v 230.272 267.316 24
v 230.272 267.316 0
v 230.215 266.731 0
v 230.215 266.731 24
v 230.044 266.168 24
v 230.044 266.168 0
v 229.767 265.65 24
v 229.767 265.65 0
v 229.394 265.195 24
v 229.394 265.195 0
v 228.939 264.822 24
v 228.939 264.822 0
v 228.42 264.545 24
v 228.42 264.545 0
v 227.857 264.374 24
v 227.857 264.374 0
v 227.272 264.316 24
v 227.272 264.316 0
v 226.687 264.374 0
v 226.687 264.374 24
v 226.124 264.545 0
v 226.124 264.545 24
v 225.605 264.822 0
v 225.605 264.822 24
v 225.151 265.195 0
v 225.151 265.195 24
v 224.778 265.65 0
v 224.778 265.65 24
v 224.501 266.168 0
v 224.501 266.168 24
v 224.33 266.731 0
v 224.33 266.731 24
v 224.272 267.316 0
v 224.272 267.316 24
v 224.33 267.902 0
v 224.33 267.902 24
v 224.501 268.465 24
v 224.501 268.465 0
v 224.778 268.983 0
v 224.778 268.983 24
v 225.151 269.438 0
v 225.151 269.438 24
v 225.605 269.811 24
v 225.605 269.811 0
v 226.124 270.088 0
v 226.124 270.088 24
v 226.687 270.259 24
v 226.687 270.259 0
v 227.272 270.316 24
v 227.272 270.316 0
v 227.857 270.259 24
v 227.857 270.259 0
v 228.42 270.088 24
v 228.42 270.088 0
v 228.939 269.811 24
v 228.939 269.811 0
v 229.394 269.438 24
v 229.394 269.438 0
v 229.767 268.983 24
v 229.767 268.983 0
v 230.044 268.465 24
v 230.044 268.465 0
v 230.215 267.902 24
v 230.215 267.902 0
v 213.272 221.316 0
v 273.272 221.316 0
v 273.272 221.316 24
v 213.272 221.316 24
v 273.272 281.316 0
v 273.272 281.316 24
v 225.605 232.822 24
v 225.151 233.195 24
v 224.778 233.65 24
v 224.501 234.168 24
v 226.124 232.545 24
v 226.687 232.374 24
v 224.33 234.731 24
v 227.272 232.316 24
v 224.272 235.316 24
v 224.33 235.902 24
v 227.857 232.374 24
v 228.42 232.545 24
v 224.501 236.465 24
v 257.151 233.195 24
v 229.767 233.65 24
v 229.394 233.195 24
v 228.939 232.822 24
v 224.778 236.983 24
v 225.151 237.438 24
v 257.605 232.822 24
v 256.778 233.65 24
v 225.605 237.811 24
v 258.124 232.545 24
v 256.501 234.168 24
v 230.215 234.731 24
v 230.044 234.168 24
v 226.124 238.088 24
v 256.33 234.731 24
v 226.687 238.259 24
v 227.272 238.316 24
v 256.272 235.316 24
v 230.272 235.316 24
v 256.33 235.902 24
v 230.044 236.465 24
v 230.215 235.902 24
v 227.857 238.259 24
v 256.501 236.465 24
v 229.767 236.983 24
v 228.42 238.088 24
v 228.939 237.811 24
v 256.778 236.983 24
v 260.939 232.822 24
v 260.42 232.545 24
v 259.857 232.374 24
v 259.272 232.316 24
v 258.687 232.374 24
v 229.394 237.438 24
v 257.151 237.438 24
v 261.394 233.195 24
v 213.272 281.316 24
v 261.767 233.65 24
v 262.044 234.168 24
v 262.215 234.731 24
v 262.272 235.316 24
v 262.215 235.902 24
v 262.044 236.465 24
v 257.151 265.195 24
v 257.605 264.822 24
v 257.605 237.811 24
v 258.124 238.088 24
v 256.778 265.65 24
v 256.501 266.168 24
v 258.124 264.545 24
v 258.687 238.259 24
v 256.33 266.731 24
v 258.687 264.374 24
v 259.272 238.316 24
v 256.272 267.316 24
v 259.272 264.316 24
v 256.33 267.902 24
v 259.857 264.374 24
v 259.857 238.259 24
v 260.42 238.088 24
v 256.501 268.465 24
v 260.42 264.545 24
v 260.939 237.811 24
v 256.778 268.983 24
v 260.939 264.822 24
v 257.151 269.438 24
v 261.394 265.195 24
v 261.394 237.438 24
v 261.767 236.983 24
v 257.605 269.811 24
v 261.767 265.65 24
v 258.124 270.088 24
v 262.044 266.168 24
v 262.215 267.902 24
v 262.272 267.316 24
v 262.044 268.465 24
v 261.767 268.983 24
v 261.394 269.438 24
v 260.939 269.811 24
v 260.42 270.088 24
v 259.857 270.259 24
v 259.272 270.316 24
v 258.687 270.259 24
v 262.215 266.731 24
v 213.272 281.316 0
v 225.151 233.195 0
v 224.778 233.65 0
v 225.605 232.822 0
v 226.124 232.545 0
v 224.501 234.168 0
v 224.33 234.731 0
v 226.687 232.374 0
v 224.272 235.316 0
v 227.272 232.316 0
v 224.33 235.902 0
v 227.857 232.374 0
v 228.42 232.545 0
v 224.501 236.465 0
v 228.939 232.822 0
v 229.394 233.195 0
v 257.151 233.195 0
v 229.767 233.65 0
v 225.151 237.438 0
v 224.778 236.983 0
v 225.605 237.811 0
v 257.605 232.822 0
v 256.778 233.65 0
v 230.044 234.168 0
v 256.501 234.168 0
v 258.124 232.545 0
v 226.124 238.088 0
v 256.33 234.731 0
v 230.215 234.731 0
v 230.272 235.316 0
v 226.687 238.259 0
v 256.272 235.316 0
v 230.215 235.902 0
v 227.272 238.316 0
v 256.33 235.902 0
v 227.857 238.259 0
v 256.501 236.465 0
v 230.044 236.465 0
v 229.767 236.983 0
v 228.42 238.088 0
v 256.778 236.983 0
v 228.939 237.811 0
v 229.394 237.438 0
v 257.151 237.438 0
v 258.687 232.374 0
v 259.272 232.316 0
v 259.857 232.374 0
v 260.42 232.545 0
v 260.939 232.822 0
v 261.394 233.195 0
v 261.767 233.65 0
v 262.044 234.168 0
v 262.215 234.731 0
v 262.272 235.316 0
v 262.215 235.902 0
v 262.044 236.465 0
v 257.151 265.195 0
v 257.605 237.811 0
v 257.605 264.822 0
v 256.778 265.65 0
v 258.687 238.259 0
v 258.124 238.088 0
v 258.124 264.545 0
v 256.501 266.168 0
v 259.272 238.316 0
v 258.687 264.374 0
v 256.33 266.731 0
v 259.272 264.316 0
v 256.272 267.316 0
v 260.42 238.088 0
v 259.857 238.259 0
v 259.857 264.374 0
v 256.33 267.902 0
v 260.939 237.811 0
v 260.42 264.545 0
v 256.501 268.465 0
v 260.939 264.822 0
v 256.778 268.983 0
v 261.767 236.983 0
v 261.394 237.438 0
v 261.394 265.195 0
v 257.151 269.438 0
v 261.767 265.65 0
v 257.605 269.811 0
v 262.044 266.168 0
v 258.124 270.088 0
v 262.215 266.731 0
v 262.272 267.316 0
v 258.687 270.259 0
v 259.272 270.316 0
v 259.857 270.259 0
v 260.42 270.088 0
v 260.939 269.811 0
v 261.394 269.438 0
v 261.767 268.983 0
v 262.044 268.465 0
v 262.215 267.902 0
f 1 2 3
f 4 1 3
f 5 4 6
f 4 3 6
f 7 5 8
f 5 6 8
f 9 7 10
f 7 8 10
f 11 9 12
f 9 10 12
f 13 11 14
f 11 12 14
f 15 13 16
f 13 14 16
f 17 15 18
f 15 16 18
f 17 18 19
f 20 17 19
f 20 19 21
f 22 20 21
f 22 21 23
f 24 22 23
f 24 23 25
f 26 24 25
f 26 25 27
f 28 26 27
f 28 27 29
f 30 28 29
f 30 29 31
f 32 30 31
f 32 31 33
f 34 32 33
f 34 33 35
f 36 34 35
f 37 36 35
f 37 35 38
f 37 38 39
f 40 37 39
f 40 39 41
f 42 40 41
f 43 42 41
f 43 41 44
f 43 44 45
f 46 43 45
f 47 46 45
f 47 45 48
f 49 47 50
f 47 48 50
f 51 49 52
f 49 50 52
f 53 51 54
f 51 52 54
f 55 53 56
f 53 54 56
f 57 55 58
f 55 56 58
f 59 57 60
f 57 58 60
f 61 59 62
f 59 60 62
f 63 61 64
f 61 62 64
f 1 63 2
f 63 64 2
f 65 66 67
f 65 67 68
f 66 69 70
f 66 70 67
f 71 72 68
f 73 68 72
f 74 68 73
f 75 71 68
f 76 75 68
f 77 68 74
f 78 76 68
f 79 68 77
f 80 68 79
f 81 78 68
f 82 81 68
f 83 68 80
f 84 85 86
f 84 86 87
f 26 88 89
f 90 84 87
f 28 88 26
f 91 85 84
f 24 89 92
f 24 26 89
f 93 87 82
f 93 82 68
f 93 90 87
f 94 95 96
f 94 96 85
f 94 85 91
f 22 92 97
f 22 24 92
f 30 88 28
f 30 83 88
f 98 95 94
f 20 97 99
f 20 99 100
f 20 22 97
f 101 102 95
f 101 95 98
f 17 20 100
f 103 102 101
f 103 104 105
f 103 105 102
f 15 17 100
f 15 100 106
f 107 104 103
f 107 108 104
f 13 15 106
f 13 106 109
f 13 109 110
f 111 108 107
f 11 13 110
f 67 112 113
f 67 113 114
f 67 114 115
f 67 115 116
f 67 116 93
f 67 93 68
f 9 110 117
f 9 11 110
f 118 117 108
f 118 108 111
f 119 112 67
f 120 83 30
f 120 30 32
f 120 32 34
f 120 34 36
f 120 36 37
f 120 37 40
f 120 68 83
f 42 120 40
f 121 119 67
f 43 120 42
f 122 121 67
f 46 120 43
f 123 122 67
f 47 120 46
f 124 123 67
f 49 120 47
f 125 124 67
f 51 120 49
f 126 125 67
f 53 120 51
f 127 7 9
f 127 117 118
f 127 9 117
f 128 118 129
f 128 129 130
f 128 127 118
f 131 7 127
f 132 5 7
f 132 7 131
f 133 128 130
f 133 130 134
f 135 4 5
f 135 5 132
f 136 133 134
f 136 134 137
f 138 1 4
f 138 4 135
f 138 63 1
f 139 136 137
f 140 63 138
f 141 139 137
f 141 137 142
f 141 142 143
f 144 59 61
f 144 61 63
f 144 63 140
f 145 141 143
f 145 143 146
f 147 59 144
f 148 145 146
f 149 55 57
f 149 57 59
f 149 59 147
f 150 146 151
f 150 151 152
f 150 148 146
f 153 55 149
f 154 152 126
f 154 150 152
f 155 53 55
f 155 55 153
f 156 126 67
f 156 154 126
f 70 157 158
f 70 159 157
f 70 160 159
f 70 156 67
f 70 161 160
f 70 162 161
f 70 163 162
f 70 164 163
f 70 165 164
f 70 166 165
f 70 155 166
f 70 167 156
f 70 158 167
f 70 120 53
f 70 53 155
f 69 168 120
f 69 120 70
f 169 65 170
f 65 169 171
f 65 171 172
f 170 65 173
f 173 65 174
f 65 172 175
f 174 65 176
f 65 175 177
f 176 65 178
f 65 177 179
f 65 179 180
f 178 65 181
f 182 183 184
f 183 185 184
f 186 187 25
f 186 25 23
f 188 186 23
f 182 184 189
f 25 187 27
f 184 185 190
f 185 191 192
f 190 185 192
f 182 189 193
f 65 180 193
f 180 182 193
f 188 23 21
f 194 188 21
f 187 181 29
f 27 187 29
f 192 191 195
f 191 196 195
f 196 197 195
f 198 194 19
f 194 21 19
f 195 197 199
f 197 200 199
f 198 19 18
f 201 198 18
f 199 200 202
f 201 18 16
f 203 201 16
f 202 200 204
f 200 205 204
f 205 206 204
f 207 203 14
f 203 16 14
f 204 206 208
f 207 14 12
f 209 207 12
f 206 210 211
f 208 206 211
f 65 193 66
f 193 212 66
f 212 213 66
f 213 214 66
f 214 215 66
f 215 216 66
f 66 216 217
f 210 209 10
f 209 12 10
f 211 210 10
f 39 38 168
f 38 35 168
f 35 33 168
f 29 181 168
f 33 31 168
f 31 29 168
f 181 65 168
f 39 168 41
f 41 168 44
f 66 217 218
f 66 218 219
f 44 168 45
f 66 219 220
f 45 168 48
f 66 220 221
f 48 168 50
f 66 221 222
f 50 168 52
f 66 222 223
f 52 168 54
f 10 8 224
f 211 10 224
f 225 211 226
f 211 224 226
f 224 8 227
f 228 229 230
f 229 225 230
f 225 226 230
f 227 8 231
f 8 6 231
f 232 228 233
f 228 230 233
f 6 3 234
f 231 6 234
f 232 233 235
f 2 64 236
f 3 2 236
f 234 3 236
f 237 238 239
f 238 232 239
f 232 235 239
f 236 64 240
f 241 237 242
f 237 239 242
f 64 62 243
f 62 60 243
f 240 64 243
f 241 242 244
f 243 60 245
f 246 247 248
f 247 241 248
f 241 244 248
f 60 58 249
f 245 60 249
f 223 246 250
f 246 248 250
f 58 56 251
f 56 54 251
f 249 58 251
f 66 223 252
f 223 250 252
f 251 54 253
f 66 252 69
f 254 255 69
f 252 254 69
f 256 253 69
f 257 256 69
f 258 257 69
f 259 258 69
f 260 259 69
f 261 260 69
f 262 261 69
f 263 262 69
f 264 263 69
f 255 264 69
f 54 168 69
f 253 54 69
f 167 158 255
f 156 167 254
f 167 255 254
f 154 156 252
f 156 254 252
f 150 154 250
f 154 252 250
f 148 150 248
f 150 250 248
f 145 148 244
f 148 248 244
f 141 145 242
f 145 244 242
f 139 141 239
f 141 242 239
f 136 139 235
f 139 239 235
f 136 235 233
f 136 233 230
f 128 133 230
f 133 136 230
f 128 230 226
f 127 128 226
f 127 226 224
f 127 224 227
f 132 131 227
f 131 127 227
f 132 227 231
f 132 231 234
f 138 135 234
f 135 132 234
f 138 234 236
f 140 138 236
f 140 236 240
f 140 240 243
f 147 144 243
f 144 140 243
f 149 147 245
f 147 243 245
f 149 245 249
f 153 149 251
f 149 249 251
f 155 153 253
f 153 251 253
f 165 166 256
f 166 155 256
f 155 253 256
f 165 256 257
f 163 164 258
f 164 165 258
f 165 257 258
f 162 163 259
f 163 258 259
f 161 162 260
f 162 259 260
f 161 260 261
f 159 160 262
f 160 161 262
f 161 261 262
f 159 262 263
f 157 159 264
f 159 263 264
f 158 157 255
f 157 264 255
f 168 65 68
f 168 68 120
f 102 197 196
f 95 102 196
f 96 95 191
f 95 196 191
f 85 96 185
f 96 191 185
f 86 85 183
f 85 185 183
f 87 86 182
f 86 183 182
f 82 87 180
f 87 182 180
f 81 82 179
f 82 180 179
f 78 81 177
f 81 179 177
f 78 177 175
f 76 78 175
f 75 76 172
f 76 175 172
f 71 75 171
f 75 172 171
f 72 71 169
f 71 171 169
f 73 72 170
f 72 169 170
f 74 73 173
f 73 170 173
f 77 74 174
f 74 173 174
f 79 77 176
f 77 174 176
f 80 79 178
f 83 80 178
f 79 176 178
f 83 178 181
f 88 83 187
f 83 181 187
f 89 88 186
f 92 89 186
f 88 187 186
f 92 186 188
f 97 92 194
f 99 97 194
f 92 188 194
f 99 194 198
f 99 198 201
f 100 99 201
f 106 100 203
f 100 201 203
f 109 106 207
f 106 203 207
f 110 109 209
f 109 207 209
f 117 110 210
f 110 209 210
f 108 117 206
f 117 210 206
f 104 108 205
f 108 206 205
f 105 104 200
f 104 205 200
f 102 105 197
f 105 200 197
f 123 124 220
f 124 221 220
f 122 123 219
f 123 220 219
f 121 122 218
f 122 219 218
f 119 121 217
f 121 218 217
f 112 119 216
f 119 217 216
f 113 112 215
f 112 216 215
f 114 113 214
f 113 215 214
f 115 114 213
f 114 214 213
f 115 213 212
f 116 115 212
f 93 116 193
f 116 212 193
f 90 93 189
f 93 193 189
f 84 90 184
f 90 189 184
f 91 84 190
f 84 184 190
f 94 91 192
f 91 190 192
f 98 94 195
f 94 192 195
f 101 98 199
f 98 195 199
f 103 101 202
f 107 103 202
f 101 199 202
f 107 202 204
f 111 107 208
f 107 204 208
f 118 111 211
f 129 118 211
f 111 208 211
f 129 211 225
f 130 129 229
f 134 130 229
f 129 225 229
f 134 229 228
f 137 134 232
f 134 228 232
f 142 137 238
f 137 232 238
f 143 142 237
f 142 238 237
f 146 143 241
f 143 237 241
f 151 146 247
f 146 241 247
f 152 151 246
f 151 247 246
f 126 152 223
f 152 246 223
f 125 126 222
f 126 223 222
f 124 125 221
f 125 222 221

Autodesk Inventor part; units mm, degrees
ref_plane "YZ Plane" through (0, 0, 0) normal (1, 0, 0) x (0, 1, 0)
ref_plane "XZ Plane" through (0, 0, 0) normal (0, 1, 0) x (-1, 0, 0)
ref_plane "Work Plane1" through (0, 0, 0) normal (0, 0, 1) x (1, 0, 0)
sketch "Sketch1" plane through (0, 0, 0) normal (0, 0, 1) x (1, 0, 0)
  circle A0 centre (259.2722, 267.3165) radius 3
  circle A1 centre (259.2722, 267.3165) radius 3
  line L0 (273.2722, 221.3165) -> (213.2722, 221.3165)
  line L1 (213.2722, 221.3165) -> (213.2722, 281.3165)
  line L2 (213.2722, 281.3165) -> (273.2722, 281.3165)
  line L3 (273.2722, 281.3165) -> (273.2722, 221.3165)
  line L4 (273.2722, 221.3165) -> (213.2722, 281.3165) construction
  line L5 (213.2722, 221.3165) -> (273.2722, 281.3165) construction
  circle A2 centre (227.2722, 267.3165) radius 3
  circle A3 centre (227.2722, 235.3165) radius 3
  circle A4 centre (259.2722, 235.3165) radius 3
  line L6 (227.2722, 235.3165) -> (259.2722, 235.3165)
  line L7 (227.2722, 267.3165) -> (227.2722, 235.3165)
  line L8 (259.2722, 267.3165) -> (259.2722, 235.3165)
  line L9 (259.2722, 267.3165) -> (227.2722, 267.3165)
  point P0 (0, 0)
  dimension "d0" = 60
  dimension "d1" = 60
  dimension "d4" = 6
  dimension "d5" = 6
  dimension "d6" = 6
  dimension "d11" = 6
  dimension "d12" = 14
  dimension "d14" = 14
  dimension "d15" = 32
extrude "Extrusion1" add sketch "Sketch1" along normal blind 24 contours A0 L8 A4 L6 A3 L7 A2 L9 | L0 L1 L2 L3
equation "\"d4\" = d5"
equation "\"d6\" = d5"
equation "\"d11\" = d5"
properties material "PMMA Plastic"
